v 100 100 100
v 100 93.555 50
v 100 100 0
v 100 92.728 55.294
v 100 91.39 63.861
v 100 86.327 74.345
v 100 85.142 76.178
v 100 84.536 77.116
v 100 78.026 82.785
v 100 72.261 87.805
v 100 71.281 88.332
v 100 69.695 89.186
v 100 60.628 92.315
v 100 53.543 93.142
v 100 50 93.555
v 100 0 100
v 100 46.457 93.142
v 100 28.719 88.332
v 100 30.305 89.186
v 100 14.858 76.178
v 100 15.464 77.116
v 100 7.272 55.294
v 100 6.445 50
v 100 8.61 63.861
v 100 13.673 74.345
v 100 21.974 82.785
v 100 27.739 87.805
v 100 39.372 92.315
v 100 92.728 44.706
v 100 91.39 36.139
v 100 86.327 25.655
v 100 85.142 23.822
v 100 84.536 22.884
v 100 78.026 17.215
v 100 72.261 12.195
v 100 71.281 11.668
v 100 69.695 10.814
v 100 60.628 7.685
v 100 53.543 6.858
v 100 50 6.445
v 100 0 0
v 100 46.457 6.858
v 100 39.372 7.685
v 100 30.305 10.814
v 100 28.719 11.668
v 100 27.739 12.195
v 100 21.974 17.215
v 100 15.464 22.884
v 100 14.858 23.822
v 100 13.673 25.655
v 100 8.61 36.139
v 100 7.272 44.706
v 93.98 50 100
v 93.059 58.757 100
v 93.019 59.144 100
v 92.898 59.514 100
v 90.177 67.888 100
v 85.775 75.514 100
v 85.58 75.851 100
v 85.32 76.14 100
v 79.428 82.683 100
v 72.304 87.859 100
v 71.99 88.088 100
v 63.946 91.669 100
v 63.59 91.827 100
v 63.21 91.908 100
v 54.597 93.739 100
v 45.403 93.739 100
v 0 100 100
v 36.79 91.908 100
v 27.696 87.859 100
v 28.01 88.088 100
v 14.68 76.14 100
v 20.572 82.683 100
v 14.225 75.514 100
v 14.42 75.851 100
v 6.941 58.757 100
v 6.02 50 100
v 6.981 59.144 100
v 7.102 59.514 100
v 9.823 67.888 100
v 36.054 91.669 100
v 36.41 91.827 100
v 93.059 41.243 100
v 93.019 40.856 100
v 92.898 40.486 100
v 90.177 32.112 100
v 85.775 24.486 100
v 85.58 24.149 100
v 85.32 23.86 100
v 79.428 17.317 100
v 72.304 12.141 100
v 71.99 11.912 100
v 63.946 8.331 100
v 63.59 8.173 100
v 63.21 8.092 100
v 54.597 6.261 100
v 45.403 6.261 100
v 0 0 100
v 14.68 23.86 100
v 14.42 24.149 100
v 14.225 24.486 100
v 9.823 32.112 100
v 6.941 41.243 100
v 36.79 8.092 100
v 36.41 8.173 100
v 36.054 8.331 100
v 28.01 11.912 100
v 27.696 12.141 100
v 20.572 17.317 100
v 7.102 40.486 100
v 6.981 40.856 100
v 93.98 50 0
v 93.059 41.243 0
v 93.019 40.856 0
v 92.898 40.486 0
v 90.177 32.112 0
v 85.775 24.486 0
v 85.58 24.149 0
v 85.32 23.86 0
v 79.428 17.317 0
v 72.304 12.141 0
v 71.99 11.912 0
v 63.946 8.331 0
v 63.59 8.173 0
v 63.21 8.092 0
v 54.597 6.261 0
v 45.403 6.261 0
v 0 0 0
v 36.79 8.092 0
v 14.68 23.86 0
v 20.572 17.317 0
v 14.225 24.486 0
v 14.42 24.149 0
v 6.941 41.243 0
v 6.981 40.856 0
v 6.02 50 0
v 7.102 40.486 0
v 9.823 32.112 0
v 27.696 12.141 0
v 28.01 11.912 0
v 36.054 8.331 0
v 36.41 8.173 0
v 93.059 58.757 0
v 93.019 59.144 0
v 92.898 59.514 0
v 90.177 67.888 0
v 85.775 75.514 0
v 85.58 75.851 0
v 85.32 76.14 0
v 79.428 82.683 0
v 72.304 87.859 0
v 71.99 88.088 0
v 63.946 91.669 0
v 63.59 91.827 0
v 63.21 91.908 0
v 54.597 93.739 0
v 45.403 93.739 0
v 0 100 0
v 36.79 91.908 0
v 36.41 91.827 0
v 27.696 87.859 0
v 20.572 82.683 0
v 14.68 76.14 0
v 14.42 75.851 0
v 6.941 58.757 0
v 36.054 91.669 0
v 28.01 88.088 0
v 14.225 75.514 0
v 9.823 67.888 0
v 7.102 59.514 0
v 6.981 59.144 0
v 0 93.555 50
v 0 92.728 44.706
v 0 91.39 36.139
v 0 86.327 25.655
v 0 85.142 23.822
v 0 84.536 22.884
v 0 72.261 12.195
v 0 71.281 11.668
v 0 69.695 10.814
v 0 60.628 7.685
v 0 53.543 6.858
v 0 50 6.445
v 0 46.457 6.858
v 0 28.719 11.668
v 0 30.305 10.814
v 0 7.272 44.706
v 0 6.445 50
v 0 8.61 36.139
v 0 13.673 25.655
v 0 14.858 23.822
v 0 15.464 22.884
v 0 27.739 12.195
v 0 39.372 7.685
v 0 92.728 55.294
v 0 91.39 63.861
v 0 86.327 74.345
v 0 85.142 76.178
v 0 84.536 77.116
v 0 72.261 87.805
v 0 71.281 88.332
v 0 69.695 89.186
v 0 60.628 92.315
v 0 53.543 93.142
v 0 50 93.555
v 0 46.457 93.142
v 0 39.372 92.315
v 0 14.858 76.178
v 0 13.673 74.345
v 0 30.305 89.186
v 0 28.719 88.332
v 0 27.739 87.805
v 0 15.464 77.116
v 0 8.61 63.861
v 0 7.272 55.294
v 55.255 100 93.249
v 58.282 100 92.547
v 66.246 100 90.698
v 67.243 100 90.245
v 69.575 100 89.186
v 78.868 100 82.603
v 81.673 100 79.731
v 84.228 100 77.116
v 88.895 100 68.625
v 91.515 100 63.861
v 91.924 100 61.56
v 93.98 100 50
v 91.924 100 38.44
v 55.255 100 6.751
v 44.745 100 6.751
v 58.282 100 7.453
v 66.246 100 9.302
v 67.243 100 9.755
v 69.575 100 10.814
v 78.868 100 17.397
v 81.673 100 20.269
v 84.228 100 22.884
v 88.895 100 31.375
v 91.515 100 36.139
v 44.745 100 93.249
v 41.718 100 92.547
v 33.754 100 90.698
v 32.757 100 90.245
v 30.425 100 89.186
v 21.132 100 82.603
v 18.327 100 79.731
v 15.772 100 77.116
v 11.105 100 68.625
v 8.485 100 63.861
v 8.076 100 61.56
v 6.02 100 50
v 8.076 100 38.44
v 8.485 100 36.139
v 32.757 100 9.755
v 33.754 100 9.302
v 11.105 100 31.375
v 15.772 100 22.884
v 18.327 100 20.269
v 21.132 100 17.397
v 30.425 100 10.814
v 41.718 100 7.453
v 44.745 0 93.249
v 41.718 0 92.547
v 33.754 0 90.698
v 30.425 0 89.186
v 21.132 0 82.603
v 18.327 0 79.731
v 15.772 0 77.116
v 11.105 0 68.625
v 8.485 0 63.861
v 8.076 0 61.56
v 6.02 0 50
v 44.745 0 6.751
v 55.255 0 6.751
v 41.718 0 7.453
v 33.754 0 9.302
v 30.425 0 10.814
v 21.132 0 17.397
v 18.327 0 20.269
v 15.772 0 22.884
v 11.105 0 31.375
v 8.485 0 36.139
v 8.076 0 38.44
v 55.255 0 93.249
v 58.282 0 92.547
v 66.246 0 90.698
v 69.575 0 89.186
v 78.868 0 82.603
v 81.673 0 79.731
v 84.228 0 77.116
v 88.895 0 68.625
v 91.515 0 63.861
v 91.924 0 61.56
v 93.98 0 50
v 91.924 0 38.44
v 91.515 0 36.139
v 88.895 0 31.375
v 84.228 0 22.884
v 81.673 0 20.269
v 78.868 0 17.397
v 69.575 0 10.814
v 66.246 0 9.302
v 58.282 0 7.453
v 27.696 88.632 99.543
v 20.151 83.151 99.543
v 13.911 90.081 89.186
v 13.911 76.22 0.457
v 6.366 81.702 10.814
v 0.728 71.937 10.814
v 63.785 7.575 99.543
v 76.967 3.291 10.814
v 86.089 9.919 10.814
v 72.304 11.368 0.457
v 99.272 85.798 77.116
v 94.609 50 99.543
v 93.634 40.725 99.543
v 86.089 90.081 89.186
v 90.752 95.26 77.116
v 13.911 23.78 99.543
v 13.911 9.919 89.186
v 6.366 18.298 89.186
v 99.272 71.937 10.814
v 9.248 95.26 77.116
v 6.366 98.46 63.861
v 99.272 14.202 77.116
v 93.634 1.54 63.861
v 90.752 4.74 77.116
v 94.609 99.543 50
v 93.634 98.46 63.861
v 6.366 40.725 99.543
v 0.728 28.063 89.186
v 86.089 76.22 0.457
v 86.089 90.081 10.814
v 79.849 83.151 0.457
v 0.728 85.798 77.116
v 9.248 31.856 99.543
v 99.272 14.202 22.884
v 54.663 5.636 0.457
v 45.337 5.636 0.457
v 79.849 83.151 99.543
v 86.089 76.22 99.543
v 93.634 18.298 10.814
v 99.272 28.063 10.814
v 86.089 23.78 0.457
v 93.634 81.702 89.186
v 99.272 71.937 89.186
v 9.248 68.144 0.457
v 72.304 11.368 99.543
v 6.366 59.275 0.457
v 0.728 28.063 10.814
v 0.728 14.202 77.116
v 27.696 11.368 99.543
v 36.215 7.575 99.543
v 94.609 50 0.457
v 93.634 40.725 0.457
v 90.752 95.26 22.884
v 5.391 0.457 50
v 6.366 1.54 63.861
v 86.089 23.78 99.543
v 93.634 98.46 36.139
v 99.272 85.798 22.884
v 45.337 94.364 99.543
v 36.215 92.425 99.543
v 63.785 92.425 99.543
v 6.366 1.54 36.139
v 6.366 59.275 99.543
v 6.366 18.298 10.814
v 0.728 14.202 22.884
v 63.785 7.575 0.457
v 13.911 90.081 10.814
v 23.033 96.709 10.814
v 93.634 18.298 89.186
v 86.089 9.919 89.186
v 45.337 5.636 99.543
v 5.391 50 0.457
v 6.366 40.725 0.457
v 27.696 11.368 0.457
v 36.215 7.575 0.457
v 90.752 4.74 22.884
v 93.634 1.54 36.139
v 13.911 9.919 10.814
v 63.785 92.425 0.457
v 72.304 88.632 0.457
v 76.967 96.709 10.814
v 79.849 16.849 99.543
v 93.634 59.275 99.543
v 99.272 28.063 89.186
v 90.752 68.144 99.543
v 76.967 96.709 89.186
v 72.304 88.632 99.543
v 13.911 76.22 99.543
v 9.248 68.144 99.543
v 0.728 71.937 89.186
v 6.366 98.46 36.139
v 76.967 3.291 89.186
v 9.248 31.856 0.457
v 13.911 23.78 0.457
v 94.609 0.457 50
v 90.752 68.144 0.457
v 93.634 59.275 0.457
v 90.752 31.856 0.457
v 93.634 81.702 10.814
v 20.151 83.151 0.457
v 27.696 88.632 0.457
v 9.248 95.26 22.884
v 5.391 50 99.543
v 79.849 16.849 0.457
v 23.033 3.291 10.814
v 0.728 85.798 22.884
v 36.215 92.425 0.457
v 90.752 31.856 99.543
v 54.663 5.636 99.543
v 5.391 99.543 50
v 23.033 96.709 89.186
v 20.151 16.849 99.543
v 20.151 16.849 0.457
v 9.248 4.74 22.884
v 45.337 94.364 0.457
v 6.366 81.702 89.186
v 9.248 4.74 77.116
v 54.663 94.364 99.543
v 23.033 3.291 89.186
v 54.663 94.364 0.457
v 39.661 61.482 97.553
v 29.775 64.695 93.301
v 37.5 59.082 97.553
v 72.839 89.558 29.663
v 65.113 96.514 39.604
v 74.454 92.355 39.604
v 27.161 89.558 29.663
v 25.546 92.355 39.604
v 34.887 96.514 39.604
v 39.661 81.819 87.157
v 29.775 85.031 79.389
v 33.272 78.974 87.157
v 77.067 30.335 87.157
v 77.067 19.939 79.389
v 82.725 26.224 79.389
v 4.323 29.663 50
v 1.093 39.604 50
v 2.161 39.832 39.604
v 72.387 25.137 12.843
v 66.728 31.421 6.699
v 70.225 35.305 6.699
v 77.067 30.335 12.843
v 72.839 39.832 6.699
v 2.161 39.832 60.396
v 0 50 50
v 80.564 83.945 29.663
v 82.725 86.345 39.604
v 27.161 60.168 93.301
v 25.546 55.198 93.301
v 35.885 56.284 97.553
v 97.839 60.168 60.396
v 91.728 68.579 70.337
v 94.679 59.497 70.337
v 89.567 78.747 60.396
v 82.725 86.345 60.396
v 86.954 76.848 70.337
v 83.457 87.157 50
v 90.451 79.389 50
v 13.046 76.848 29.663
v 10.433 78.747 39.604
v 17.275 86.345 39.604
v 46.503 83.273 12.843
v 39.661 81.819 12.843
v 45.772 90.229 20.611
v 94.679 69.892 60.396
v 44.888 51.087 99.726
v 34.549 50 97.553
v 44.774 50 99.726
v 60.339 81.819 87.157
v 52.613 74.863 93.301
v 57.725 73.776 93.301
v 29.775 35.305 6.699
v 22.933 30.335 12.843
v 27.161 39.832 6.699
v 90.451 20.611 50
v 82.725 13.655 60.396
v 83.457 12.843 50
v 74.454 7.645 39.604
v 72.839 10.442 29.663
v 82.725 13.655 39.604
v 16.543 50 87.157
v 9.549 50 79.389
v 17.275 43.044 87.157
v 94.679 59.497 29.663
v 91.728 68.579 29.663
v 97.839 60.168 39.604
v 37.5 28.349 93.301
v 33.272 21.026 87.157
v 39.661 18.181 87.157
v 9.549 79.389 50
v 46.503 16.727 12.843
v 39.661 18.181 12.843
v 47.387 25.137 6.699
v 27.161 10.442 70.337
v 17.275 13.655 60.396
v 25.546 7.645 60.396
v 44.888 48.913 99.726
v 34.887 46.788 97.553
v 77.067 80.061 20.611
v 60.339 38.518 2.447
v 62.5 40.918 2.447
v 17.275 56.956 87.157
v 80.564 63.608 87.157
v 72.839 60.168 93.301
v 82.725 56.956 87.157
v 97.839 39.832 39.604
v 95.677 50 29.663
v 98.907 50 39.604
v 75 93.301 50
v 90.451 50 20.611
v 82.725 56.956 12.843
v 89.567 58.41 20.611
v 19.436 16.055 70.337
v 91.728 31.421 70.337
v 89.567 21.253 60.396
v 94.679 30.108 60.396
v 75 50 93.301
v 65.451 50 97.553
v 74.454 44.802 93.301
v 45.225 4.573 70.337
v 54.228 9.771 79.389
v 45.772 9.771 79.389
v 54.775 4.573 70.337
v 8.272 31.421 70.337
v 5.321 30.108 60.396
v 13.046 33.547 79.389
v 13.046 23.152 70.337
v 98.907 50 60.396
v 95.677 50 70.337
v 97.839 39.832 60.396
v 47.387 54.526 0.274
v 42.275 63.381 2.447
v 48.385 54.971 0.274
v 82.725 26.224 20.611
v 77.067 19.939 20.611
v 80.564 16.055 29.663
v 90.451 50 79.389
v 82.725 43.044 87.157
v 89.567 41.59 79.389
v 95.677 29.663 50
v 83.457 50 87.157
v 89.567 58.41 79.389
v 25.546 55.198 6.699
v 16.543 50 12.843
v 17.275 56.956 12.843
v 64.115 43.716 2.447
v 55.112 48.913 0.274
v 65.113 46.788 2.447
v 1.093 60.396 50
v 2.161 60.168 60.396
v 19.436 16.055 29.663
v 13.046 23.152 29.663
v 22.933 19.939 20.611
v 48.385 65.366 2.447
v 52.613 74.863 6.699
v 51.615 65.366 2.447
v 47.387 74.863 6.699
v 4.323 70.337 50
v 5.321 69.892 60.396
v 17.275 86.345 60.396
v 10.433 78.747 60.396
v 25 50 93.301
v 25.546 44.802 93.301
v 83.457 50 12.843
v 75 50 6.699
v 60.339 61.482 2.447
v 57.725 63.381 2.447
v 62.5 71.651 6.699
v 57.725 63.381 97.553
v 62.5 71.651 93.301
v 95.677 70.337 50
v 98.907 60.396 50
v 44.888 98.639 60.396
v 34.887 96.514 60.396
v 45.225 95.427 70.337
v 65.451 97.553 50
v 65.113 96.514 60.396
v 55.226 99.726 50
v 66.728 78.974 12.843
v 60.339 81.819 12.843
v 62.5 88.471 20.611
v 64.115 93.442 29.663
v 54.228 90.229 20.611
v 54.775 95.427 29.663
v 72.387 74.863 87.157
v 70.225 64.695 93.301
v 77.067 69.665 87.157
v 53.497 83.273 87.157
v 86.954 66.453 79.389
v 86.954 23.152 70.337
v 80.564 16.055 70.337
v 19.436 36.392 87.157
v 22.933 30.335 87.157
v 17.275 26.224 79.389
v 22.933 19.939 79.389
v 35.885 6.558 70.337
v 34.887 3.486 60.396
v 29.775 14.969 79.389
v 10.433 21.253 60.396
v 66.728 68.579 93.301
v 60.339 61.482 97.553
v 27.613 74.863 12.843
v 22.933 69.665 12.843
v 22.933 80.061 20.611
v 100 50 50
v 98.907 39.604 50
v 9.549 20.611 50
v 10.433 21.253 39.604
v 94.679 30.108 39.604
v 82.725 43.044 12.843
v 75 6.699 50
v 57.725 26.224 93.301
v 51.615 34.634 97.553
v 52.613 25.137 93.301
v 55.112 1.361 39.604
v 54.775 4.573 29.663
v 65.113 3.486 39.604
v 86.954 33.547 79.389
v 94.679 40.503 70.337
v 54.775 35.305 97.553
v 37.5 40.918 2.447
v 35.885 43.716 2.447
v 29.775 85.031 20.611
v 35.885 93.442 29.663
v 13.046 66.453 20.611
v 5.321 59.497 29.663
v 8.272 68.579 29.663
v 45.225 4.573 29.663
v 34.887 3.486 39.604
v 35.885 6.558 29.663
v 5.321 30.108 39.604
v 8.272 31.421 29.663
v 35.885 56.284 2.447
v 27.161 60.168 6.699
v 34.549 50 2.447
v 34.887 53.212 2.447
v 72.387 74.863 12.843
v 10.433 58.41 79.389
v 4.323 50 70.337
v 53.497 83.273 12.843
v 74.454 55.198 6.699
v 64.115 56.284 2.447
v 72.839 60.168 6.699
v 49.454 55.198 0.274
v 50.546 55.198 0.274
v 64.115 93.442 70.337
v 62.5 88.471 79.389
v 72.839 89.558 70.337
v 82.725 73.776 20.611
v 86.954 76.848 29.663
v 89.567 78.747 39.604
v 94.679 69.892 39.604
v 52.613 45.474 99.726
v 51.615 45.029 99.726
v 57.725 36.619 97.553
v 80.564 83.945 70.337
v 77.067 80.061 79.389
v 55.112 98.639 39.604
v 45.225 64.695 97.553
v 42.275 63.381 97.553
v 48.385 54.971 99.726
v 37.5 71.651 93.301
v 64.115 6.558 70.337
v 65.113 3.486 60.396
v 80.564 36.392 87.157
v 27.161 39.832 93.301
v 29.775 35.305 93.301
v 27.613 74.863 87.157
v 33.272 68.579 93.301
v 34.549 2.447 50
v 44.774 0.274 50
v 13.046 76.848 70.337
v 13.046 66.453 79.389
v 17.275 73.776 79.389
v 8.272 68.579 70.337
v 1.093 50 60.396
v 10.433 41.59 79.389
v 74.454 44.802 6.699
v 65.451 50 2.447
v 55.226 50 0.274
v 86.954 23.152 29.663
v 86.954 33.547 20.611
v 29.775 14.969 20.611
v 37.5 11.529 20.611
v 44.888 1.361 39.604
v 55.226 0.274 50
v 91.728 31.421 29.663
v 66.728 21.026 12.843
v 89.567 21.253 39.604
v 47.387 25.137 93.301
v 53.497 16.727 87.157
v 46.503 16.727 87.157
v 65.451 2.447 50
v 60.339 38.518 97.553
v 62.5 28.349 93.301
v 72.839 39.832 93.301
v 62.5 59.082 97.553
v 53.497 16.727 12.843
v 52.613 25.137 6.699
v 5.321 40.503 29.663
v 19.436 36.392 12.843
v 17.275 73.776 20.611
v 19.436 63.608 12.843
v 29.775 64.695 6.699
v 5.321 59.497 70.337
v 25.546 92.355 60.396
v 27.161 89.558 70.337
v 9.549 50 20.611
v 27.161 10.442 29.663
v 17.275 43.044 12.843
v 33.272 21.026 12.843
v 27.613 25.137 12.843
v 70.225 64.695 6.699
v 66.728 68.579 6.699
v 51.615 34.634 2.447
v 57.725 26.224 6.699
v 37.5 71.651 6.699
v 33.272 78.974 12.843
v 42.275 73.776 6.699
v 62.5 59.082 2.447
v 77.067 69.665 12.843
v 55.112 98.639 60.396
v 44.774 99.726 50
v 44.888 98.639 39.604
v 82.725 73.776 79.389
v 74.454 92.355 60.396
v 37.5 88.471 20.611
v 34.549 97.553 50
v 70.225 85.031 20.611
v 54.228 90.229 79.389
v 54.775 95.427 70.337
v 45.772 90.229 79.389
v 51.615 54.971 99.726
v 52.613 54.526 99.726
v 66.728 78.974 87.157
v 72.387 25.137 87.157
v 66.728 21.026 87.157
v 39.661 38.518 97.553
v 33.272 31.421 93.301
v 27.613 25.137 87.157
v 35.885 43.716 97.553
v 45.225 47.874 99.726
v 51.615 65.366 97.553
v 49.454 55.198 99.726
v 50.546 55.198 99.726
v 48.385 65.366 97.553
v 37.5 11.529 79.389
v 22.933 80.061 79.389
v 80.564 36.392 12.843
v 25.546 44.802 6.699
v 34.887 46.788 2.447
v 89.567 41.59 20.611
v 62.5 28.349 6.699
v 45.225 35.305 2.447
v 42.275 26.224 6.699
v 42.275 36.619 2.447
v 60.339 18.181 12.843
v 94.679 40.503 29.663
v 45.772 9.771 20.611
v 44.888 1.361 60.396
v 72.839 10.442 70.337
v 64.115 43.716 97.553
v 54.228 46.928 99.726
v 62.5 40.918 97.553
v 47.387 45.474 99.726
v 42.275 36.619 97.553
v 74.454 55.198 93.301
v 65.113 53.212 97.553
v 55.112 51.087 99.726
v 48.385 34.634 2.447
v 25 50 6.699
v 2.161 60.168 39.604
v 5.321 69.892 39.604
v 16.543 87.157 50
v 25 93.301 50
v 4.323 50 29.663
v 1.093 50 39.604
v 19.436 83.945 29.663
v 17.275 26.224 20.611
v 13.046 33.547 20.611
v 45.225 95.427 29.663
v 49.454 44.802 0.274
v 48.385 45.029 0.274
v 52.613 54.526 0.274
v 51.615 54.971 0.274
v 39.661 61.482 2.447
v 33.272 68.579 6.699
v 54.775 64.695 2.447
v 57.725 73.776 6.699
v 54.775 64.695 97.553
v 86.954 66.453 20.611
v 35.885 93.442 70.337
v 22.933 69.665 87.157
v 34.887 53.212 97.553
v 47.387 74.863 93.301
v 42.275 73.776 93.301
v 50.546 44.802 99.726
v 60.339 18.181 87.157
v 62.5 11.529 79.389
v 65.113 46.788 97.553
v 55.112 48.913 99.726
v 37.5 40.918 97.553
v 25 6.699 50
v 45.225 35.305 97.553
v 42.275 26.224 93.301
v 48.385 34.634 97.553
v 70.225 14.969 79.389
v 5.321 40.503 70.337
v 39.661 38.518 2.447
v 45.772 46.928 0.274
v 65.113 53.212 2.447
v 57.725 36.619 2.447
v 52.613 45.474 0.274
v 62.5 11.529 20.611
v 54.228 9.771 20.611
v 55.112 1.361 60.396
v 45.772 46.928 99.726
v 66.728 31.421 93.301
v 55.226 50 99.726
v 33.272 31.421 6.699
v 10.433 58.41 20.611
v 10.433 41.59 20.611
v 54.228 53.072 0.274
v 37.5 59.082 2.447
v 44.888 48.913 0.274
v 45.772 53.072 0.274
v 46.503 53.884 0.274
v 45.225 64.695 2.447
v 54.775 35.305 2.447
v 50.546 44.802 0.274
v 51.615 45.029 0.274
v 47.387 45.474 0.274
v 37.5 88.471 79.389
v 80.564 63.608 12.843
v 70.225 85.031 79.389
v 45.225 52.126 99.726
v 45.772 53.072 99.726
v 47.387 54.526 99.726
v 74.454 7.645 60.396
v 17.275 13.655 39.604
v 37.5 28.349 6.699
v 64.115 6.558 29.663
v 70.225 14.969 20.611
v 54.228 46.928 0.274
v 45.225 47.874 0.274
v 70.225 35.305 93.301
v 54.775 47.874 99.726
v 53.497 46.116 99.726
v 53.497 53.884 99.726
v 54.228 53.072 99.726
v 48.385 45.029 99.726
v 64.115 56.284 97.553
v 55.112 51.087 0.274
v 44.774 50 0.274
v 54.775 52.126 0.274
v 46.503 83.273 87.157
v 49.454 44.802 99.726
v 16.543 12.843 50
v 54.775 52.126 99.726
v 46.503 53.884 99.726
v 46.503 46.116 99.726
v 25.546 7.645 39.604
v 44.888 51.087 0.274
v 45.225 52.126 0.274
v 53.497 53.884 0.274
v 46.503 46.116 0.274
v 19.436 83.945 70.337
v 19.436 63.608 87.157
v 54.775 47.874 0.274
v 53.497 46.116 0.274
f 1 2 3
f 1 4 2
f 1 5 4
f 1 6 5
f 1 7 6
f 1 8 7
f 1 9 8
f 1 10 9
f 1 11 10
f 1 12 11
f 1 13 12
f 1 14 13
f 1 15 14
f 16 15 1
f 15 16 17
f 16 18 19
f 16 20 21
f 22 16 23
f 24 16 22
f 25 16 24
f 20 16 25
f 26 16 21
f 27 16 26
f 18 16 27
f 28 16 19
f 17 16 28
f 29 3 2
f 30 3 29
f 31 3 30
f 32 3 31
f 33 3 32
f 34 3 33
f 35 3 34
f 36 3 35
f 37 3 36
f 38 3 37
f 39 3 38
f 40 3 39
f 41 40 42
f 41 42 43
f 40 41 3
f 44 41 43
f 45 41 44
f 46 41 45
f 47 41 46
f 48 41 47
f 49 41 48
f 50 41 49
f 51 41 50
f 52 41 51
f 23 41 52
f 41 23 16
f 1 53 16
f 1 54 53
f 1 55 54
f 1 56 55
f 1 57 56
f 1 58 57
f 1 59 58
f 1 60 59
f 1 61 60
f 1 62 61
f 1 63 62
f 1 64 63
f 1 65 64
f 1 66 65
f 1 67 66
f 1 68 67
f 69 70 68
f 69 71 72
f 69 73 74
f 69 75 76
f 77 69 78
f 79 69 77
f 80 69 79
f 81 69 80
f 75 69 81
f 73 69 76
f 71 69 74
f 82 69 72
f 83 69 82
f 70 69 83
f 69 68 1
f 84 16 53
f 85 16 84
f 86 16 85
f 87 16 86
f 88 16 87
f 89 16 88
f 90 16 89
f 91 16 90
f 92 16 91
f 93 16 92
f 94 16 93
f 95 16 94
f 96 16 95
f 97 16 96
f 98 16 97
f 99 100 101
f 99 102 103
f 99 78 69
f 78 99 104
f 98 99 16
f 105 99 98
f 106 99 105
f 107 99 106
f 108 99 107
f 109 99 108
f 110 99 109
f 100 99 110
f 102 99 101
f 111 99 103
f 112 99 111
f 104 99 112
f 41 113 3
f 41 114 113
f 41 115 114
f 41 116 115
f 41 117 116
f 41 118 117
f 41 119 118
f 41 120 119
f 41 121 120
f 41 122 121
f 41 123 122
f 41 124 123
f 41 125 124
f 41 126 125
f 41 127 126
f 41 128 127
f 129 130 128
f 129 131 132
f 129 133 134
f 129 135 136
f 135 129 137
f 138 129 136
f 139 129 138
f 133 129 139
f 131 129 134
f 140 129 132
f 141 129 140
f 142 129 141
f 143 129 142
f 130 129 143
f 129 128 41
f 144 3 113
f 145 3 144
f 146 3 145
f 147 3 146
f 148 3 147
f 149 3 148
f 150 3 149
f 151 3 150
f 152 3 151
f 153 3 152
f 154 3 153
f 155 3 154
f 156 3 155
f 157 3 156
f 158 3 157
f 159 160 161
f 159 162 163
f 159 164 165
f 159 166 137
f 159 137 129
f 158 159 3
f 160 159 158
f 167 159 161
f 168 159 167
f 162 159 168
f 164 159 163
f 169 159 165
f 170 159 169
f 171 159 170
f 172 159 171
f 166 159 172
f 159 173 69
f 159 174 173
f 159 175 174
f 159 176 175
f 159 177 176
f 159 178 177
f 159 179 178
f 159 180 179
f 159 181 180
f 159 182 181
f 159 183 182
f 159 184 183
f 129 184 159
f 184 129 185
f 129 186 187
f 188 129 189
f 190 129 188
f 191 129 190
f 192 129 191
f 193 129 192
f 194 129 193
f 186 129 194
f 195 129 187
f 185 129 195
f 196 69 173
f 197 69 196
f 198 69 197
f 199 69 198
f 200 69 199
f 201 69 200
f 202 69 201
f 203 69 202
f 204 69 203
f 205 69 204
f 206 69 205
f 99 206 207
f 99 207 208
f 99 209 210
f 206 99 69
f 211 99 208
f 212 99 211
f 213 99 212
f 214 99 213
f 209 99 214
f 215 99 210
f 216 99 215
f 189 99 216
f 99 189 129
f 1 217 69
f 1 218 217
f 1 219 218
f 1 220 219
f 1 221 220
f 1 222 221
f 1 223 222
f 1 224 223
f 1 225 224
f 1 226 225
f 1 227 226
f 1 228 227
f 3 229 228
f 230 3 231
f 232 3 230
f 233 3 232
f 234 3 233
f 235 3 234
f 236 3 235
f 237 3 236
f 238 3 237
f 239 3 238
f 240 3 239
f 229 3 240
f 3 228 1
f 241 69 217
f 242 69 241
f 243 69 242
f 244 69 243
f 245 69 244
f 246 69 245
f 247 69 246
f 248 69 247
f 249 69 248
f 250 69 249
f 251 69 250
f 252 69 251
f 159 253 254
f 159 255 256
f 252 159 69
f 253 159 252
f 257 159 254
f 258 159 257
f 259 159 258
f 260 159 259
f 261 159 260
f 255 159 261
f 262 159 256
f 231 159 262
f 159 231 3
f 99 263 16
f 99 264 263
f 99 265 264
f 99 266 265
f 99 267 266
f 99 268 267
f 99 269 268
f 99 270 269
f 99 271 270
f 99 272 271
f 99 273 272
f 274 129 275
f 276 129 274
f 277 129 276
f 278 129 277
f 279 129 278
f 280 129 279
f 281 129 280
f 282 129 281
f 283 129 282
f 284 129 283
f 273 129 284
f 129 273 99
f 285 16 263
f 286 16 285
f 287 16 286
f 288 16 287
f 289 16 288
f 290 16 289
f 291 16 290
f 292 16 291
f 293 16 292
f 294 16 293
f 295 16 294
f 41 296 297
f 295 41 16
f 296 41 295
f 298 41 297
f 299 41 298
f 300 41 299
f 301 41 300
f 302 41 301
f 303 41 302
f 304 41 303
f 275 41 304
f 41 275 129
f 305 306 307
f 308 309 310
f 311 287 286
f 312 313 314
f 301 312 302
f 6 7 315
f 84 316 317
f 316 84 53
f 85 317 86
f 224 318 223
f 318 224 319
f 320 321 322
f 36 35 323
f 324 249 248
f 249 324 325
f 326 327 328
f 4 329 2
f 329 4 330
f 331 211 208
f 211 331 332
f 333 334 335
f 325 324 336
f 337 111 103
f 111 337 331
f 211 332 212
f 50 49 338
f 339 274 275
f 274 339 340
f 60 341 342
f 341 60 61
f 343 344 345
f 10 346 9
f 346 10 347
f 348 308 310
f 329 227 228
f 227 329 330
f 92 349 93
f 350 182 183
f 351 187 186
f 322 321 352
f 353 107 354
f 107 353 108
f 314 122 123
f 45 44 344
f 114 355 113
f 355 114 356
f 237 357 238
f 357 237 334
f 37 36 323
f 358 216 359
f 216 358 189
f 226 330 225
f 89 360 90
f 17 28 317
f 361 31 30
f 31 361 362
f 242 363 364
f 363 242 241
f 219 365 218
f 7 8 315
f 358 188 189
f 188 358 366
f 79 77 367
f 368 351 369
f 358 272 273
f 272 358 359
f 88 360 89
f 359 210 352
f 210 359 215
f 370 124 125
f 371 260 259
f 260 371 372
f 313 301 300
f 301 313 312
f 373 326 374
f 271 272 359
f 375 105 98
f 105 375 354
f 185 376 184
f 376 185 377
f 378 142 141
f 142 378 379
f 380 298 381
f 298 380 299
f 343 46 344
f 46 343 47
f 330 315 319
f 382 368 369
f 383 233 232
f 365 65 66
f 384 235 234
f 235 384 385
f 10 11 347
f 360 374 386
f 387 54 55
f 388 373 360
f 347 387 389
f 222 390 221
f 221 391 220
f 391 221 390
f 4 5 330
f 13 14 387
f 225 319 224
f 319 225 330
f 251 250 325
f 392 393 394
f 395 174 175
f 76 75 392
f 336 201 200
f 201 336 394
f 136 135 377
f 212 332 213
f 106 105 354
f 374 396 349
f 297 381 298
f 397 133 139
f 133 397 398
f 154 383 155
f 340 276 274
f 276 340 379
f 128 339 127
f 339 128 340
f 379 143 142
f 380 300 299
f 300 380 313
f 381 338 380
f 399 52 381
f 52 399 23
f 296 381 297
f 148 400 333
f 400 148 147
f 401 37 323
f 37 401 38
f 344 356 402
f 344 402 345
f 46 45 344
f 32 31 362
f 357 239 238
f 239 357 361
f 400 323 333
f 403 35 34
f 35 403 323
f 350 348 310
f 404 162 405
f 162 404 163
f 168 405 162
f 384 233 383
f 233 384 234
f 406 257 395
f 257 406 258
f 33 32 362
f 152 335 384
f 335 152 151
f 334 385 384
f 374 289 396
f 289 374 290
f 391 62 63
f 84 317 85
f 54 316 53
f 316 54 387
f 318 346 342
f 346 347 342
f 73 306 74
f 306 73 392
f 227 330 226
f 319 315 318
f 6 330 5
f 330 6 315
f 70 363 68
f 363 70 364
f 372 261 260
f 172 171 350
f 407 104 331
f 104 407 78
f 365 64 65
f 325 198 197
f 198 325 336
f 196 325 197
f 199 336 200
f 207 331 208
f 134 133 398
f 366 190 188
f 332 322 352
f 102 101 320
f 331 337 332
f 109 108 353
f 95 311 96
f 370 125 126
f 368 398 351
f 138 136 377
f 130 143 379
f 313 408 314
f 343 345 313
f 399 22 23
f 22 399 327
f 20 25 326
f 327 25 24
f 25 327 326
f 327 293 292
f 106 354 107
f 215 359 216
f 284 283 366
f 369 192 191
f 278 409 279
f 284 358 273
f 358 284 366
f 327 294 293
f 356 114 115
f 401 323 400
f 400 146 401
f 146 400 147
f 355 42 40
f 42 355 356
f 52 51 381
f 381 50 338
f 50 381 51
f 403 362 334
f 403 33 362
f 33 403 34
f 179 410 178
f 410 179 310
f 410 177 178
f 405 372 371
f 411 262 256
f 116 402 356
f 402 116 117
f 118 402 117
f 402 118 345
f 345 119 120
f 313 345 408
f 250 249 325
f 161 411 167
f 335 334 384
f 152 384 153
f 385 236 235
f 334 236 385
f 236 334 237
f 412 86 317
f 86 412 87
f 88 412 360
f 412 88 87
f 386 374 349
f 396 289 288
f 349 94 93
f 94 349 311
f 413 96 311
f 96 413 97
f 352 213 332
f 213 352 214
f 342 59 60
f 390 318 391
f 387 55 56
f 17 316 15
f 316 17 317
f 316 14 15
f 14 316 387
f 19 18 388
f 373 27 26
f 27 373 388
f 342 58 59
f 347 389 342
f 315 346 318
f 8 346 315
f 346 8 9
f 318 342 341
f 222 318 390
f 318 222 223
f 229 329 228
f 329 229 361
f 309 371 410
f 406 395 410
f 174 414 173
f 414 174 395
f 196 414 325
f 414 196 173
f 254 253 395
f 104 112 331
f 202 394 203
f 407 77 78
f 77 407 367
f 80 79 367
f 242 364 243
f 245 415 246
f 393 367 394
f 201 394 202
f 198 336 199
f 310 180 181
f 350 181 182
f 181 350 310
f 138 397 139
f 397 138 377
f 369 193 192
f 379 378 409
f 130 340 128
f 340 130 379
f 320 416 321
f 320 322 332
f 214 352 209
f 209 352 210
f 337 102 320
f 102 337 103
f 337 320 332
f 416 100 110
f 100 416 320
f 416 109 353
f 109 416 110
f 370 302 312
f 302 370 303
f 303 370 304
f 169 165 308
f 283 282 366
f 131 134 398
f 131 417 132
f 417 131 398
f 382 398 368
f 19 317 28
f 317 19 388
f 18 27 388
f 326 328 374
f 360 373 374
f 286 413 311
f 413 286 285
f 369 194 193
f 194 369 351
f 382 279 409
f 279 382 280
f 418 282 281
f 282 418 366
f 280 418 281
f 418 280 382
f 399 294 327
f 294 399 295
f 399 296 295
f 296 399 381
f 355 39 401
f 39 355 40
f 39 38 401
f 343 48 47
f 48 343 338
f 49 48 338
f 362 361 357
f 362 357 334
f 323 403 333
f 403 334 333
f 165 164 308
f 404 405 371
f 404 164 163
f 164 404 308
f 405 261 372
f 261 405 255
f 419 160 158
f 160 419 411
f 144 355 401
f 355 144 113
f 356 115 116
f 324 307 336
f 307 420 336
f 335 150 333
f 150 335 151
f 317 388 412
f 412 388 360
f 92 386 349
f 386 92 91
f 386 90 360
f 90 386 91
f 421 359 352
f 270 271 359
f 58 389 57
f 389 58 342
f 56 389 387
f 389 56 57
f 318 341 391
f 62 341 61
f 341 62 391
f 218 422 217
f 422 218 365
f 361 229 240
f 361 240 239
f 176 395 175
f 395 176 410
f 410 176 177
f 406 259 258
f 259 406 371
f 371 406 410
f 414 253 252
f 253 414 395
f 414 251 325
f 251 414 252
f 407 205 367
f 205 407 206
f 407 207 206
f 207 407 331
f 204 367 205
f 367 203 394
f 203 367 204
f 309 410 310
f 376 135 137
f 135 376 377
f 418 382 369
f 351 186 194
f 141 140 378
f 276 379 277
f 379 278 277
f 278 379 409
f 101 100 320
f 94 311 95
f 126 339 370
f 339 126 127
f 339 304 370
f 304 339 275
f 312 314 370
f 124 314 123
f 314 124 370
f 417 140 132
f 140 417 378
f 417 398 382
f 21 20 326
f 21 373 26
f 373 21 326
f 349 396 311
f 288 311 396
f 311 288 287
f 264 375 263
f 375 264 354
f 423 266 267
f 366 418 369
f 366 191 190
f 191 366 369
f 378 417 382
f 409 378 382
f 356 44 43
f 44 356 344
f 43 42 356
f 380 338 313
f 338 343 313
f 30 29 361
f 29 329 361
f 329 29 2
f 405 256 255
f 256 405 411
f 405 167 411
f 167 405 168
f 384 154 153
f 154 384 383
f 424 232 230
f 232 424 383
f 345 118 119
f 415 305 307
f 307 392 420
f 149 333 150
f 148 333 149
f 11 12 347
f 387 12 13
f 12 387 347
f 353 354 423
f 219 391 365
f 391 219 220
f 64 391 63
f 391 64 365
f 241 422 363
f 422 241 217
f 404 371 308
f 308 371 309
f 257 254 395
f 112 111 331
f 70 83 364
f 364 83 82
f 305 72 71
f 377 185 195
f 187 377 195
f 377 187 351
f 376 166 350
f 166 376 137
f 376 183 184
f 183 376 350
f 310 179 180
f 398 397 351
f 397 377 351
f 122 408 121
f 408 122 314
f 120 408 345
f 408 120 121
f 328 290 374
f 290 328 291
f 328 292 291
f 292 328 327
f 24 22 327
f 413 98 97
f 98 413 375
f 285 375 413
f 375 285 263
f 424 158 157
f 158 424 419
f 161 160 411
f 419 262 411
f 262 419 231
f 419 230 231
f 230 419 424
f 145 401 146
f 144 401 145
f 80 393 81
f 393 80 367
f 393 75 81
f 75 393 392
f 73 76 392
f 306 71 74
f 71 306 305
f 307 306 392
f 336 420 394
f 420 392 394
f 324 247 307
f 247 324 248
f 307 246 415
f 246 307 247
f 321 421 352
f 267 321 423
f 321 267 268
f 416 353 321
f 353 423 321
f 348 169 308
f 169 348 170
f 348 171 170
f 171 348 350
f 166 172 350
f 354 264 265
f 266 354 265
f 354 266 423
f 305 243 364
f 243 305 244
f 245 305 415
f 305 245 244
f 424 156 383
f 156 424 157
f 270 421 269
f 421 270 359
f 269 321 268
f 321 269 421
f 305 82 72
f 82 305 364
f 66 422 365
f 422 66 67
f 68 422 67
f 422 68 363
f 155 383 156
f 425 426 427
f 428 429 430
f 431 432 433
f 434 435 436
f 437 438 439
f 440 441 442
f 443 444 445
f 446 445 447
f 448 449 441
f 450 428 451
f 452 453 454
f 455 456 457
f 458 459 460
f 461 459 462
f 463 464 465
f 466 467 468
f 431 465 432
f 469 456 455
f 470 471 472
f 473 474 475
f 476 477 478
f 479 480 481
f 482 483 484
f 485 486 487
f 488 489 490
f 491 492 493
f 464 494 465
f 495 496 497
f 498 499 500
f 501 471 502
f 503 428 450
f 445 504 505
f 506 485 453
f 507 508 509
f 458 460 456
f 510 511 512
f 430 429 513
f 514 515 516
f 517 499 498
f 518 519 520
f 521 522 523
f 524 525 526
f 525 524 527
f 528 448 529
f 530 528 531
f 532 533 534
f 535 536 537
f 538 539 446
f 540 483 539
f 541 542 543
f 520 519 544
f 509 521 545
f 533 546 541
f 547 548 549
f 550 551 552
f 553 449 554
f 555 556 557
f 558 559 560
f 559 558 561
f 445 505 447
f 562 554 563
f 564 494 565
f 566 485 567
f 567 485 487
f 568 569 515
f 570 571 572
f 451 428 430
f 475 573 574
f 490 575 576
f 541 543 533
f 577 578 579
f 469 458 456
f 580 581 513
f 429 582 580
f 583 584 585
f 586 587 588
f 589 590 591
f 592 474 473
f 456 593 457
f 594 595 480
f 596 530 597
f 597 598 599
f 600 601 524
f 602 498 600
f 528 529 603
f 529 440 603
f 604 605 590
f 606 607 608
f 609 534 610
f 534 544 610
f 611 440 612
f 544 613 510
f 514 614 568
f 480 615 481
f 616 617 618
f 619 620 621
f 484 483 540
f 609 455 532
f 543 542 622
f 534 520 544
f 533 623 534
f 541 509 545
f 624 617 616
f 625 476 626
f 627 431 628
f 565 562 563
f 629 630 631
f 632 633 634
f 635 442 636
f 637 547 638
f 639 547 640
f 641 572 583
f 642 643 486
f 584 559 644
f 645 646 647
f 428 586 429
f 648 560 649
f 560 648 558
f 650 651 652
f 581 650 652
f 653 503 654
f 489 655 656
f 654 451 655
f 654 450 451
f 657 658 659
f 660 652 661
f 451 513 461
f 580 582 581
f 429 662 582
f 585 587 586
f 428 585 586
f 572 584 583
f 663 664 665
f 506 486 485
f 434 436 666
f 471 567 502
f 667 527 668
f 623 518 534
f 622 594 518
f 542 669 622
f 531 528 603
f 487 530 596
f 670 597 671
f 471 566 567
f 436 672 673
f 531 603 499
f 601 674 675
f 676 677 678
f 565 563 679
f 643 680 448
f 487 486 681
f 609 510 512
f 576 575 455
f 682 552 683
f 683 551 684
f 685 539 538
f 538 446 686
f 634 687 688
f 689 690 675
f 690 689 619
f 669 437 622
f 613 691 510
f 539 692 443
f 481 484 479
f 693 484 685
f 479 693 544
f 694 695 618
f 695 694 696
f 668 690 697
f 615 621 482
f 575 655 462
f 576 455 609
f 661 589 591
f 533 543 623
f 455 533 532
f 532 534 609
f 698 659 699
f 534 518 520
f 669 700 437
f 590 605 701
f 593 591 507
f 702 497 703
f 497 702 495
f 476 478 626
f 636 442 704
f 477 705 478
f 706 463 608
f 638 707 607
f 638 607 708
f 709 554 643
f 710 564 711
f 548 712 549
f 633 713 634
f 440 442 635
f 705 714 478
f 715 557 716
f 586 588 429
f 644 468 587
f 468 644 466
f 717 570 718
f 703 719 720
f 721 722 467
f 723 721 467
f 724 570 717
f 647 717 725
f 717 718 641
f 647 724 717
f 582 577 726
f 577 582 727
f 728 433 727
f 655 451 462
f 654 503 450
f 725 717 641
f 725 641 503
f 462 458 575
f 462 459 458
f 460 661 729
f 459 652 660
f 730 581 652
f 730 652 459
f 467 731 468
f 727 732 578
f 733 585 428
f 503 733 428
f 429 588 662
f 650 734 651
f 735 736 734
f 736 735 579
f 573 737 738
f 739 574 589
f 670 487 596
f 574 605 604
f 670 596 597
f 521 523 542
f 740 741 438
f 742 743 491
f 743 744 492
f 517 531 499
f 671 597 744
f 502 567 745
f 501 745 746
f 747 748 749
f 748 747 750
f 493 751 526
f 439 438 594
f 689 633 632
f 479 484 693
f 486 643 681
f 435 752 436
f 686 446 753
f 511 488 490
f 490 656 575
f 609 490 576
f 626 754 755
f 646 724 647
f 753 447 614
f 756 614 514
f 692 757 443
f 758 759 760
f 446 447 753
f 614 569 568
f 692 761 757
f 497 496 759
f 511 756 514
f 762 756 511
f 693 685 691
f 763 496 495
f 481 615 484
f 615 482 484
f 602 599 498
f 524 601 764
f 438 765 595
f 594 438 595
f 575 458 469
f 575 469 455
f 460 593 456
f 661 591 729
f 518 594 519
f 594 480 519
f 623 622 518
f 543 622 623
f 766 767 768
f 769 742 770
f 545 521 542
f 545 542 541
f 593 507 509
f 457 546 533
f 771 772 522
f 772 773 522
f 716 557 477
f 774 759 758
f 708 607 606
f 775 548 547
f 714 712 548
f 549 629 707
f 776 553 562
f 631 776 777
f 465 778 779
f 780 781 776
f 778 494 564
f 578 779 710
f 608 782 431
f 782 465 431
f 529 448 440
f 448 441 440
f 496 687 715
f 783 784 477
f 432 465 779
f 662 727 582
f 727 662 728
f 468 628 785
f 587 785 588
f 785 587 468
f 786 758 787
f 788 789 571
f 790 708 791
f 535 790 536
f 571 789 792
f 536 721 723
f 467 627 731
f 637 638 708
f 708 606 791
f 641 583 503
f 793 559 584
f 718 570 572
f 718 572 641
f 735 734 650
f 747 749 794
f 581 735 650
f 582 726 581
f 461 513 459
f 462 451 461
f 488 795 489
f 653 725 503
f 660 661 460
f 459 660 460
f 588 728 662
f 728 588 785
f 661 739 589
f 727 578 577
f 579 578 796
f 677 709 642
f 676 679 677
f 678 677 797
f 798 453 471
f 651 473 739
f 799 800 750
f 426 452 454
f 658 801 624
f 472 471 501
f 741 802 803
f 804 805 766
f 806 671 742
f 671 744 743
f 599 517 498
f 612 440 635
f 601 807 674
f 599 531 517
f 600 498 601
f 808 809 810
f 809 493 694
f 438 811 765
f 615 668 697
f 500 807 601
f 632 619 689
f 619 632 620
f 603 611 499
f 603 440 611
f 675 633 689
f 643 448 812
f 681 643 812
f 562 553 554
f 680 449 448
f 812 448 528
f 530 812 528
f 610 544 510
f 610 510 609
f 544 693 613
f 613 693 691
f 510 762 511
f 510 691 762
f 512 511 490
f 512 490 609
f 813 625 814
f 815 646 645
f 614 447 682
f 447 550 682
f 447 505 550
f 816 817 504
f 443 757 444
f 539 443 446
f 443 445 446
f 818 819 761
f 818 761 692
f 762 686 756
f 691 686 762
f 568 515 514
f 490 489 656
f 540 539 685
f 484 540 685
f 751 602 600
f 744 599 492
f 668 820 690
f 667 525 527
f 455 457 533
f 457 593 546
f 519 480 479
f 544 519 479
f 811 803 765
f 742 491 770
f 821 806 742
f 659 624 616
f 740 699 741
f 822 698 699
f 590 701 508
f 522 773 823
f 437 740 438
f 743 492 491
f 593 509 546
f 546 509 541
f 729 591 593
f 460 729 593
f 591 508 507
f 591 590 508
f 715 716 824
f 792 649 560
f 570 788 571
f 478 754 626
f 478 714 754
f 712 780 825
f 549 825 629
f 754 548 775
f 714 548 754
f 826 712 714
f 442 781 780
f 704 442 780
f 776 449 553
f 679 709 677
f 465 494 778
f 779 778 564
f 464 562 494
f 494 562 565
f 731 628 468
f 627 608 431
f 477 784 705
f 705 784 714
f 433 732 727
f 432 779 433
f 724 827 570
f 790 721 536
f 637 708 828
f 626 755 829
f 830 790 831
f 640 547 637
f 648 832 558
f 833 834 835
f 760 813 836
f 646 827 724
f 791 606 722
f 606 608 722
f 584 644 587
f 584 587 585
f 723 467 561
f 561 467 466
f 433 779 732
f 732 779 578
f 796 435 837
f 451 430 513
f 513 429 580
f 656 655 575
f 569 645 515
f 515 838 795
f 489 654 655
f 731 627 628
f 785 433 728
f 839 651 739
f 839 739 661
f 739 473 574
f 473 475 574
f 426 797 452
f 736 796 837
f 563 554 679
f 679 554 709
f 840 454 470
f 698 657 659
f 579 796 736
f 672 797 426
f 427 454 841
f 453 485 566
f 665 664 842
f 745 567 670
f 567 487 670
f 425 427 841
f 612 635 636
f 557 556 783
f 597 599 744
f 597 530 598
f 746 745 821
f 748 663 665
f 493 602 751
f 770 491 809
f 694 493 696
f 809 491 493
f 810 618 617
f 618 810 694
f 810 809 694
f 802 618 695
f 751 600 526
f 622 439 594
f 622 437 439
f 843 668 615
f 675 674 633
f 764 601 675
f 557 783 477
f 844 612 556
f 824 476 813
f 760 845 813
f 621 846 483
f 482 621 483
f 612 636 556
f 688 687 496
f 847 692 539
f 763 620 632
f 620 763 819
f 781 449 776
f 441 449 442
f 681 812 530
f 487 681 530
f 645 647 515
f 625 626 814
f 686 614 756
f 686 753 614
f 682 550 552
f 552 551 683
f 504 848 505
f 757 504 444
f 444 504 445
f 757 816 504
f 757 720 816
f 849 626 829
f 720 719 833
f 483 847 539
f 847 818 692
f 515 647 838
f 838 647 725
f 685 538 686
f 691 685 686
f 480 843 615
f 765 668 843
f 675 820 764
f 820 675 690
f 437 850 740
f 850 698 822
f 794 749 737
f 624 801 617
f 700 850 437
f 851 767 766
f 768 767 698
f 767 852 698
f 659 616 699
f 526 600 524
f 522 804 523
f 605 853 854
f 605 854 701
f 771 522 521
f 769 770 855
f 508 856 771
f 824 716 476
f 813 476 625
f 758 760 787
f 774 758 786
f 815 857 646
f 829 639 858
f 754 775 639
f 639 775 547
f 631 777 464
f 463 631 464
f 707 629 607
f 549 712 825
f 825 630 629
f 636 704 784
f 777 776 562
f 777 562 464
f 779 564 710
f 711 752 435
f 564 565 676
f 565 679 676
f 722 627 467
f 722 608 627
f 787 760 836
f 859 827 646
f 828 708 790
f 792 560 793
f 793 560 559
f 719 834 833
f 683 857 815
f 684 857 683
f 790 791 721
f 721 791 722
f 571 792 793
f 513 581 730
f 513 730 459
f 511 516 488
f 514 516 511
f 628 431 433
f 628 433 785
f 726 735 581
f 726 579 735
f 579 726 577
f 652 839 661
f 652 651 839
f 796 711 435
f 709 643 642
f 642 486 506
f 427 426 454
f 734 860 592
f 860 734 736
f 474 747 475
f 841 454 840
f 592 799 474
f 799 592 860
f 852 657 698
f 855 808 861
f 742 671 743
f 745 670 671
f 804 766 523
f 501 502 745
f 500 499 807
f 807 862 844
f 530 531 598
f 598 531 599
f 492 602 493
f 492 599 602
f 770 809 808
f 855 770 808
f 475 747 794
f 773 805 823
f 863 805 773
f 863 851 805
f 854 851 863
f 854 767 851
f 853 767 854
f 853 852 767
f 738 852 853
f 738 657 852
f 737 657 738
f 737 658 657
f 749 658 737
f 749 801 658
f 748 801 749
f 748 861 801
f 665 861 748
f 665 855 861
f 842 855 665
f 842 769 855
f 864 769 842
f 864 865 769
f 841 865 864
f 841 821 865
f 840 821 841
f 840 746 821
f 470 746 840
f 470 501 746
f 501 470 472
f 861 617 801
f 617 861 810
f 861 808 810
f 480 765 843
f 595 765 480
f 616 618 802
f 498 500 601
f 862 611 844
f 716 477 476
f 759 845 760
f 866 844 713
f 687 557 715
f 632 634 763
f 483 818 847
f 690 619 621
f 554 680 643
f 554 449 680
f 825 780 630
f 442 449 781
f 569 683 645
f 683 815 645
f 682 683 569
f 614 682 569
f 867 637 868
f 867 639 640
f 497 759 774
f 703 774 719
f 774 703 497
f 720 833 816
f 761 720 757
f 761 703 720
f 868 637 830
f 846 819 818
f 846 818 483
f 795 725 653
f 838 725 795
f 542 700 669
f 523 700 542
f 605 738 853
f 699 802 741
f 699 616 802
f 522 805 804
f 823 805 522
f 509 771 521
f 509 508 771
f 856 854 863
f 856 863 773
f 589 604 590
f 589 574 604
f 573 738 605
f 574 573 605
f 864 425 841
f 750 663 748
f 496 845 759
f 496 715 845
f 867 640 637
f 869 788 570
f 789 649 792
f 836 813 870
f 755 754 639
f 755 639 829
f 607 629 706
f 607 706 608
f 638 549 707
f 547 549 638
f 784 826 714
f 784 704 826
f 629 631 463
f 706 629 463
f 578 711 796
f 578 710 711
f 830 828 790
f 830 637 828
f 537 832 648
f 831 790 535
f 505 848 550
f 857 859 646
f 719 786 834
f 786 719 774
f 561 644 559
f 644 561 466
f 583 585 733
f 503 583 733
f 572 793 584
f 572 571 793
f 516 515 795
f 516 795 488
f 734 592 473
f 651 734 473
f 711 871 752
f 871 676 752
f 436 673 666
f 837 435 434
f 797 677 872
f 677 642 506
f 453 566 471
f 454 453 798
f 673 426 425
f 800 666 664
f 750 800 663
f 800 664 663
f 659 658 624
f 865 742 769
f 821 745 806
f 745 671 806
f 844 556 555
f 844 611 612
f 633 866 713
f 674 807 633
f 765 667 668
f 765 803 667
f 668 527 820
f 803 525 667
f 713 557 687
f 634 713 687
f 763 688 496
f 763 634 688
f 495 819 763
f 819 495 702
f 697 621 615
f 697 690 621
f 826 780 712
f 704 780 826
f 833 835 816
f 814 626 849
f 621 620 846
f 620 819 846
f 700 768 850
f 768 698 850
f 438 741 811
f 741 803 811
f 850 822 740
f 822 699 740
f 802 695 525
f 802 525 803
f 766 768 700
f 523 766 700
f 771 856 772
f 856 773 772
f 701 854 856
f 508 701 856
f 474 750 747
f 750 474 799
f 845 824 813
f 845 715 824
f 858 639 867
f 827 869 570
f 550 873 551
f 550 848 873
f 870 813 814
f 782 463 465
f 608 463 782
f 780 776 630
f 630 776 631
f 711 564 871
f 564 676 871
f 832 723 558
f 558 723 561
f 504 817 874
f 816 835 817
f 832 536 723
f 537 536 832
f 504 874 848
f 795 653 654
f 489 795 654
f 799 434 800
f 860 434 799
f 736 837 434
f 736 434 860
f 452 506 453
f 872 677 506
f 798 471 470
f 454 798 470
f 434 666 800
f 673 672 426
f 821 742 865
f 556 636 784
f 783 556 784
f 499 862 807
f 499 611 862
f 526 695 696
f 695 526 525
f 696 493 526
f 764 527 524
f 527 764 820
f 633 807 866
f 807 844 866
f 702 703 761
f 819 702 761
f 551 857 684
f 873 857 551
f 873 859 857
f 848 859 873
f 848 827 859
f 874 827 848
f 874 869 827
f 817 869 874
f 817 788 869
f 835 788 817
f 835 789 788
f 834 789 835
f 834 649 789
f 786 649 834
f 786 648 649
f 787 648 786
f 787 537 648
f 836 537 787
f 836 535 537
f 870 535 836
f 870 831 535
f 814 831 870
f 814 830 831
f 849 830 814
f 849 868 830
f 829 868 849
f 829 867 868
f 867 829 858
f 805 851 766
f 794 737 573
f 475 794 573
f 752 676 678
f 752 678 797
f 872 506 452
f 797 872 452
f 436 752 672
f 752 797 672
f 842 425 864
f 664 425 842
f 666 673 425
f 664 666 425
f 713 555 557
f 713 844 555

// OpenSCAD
// to modify

_WhichColor = "All";
cubeSize = 100;
ratio = 3 / 4;

// code

module coloredModule(colorValue) {
  if(_WhichColor == "All" || _WhichColor == colorValue)
  color(colorValue) children();
}

coloredModule("purple")
difference() {
  cube(cubeSize);
//   union() {
//     delta = cubeSize * ((1 - ratio) / 2);
//     translate(v = [ -cubeSize / 2, delta, delta ])
//         cube([ cubeSize * 2, cubeSize * ratio, cubeSize * ratio ]);
//     translate(v = [ delta, -cubeSize / 2, delta ])
//         cube([ cubeSize * ratio, cubeSize * 2, cubeSize * ratio ]);
//     translate(v = [ delta, delta, -cubeSize / 2 ])
//         cube([ cubeSize * ratio, cubeSize * ratio, cubeSize * 2 ]);
//   }
  translate([ cubeSize / 2, cubeSize / 2, cubeSize / 2 ])
  sphere(r = cubeSize * 2/3);
}

coloredModule("orange")
translate(v = [cubeSize/2,cubeSize/2,cubeSize/2])
sphere(r = cubeSize/2);
